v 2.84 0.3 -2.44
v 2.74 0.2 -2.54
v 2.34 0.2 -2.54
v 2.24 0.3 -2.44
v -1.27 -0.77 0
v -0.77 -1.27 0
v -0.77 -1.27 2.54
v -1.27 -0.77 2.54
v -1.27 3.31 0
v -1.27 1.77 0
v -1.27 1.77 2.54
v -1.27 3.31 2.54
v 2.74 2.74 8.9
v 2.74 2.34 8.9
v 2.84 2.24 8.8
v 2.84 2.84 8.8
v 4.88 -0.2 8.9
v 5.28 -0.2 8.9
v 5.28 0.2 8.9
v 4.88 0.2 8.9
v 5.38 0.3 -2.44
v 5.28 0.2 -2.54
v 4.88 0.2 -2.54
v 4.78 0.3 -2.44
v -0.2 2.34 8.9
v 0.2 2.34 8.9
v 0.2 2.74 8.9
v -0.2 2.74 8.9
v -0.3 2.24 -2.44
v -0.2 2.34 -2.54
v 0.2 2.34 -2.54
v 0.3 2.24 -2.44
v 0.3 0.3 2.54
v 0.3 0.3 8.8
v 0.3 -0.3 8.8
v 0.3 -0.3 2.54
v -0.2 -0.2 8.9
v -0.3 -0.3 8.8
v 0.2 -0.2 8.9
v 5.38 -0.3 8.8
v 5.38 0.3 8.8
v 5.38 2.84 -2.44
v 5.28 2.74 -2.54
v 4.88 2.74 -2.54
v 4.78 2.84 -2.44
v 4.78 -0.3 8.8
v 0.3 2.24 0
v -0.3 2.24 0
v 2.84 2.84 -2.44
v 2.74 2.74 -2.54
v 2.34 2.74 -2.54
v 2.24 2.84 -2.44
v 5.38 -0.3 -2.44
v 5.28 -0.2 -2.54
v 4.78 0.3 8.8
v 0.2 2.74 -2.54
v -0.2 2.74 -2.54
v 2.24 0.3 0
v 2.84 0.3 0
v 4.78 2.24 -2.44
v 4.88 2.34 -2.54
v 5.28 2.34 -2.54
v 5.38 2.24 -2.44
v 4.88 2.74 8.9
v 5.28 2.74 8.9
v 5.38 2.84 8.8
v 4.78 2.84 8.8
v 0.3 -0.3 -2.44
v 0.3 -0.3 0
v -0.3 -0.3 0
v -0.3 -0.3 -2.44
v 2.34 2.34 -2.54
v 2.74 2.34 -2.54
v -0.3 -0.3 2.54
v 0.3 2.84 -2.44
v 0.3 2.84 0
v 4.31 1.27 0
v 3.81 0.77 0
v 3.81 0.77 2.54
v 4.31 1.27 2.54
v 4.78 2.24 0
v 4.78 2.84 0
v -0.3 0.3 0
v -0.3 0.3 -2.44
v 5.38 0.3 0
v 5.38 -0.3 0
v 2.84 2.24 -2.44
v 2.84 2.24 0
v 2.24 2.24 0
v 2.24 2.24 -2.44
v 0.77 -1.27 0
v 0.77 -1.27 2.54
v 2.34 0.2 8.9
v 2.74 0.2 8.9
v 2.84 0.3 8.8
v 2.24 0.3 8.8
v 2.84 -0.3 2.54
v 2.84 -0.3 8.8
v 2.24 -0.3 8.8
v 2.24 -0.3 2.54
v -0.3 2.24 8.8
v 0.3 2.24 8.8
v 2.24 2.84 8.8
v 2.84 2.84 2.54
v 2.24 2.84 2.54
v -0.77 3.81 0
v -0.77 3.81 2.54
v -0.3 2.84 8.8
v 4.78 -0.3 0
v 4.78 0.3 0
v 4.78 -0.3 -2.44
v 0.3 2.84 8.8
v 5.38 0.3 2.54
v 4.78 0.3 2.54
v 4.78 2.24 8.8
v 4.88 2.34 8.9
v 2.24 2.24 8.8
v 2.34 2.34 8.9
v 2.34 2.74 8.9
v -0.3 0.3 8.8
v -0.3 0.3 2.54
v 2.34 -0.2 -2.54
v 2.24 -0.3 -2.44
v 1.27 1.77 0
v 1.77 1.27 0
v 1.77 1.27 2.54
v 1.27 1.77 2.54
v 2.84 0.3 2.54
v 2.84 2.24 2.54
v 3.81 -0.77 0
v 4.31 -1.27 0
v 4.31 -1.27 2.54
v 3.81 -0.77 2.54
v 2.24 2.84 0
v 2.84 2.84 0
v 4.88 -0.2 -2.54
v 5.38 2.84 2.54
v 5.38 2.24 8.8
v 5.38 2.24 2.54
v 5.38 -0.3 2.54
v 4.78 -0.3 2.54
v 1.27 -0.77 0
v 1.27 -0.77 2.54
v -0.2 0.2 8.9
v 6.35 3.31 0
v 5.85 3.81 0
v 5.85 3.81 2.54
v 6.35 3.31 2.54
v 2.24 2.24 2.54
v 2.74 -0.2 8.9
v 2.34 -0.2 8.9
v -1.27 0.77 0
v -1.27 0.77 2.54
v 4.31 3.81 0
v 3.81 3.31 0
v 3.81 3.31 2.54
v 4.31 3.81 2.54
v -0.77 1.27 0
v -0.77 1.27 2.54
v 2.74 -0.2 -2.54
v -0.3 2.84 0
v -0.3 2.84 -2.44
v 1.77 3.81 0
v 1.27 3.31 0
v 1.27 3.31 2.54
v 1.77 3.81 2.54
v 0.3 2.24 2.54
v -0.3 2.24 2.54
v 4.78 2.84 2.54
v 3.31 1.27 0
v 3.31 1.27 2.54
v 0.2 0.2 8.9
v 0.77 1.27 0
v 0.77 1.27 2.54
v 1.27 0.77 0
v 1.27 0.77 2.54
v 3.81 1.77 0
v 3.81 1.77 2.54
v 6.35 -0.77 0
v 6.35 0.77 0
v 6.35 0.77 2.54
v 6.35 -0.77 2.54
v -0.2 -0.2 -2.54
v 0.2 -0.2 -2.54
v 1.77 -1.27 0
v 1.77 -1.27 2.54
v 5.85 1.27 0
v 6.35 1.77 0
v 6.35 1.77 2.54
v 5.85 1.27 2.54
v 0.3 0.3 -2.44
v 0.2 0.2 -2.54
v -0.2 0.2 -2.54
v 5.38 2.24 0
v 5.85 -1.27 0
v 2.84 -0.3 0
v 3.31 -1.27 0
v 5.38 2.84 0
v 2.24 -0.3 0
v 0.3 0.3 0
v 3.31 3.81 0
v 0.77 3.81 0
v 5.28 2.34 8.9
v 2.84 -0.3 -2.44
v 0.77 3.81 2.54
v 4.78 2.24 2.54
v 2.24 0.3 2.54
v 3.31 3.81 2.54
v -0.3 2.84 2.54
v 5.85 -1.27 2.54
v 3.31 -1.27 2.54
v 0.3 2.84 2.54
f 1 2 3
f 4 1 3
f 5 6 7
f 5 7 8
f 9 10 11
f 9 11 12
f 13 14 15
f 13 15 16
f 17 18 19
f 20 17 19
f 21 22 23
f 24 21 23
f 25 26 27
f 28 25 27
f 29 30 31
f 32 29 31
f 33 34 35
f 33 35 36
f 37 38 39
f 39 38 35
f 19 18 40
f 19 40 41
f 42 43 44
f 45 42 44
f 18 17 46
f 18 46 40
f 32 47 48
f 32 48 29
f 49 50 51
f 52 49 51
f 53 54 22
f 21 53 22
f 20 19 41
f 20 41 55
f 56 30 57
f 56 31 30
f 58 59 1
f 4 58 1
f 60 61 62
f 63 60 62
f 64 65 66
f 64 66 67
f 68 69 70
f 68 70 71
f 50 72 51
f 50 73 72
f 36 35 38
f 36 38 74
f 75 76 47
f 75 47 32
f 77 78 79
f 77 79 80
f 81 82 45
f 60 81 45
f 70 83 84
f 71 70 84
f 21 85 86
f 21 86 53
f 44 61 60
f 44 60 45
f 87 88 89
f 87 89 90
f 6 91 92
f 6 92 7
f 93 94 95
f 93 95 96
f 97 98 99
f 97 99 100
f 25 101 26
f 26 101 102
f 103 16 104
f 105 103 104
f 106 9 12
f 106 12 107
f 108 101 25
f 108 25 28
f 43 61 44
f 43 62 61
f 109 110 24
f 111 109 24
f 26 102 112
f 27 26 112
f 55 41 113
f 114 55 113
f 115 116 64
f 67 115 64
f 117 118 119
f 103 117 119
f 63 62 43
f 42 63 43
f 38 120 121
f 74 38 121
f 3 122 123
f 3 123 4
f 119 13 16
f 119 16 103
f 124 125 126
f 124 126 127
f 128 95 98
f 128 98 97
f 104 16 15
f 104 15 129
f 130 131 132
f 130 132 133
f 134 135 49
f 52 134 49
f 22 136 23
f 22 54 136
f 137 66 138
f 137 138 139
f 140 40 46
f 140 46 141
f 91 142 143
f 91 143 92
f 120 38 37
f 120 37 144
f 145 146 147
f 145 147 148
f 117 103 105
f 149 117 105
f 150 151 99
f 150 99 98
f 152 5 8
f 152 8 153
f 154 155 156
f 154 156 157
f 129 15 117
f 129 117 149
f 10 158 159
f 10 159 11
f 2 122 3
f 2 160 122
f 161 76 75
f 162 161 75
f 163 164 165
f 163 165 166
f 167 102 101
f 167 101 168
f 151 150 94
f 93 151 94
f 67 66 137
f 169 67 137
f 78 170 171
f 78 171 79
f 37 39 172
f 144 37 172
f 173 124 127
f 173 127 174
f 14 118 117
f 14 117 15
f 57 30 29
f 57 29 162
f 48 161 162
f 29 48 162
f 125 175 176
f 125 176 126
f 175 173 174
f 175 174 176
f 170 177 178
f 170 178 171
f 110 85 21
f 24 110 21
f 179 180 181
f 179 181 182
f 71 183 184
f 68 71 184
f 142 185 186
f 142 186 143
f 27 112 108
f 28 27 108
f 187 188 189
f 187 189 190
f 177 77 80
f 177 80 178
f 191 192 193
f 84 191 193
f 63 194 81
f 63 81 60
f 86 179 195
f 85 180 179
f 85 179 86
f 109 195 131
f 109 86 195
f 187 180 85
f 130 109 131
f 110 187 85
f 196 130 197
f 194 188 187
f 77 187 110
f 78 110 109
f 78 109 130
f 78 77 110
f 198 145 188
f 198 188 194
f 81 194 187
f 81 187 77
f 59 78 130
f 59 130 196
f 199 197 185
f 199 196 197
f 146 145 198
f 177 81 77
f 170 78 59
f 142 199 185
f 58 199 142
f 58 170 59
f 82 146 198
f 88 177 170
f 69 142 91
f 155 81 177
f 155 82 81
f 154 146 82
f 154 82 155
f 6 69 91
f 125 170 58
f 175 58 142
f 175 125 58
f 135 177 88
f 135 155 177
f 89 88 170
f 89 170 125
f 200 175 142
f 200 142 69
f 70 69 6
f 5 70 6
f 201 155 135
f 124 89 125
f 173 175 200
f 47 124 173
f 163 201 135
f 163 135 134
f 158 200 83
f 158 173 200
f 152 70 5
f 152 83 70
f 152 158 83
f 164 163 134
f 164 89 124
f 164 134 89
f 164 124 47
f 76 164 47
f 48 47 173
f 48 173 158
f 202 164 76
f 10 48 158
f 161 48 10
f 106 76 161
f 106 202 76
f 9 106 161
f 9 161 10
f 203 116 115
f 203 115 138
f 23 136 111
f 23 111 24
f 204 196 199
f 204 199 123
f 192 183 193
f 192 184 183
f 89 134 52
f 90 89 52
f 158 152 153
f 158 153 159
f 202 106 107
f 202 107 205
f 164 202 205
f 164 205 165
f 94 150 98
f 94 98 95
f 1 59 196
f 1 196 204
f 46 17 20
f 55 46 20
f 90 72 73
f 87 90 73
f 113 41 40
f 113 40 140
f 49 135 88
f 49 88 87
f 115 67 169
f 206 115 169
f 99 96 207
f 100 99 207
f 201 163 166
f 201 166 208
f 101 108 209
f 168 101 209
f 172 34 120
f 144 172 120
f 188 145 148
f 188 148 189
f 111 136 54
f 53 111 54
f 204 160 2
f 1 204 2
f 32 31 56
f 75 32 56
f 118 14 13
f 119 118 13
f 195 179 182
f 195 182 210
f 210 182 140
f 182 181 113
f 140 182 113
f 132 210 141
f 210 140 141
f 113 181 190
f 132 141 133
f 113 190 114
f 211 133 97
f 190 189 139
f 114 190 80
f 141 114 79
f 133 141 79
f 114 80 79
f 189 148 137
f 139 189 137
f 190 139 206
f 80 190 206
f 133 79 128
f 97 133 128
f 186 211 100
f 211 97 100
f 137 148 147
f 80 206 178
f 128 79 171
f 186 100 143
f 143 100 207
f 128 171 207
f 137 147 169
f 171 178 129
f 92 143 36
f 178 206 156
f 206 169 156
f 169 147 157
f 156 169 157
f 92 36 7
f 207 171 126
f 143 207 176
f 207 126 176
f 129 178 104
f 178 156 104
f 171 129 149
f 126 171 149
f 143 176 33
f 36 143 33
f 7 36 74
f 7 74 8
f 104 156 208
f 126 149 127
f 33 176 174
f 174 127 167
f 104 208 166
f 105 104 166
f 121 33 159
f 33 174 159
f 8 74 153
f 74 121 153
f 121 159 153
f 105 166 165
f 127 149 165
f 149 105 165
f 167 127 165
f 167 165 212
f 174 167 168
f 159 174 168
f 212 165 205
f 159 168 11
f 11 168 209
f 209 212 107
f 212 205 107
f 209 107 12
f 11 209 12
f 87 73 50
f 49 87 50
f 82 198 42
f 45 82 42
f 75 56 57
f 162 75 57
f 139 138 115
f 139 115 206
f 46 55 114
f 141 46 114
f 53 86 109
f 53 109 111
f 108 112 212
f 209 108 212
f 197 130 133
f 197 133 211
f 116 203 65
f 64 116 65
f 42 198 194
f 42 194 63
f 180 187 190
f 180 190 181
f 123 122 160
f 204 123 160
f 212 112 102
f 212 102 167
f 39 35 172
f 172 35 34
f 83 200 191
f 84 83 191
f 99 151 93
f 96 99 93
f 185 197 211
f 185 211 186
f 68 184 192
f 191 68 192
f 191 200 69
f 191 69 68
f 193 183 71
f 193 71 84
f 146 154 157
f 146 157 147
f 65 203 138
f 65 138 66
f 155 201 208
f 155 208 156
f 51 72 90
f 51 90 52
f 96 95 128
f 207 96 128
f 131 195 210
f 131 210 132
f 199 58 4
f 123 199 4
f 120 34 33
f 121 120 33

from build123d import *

# Parameters (mm, degrees)
PLASTIC_DEPTH                     = 2.54
SKETCH2_W                         = 11.44
SKETCH2_H                         = 0.6
CONTACT_DEPTH                     = 0.3
CHAMFER1_SIZE                     = 0.1
PATTERN_LINEAR_1_COUNT            = 3
PATTERN_LINEAR_1_PITCH            = 2.54
PATTERN_LINEAR_1_COUNT_DIR2       = 2
PATTERN_LINEAR_1_PITCH_DIR2       = 2.54
CHAMFER1_OF_PATTERN_LINEAR_1_SIZE = 0.1


with BuildPart() as part:
    # Sketch1 → Plastic (new body)
    with BuildSketch(Plane.XY):
        Polygon((-0.77, 1.27), (0.77, 1.27), (1.27, 0.77), (1.27, -0.77), (0.77, -1.27), (-0.77, -1.27), (-1.27, -0.77), (-1.27, 0.77), align=None)
    plastic = extrude(amount=PLASTIC_DEPTH)

    # Sketch2 → Contact (add, symmetric)
    with BuildSketch(Plane(origin=(0, 0, 0), x_dir=(0, 0, -1), z_dir=(1, 0, 0))):
        with Locations((-3.18, 0)):
            Rectangle(SKETCH2_W, SKETCH2_H)
    contact = extrude(amount=CONTACT_DEPTH, both=True)

    # Chamfer1
    chamfer1_edges = [part.edges().sort_by_distance(p)[0] for p in [
        (0, -0.3, 8.9),
        (0.3, 0, 8.9),
        (-0.3, 0, -2.54),
        (0, -0.3, -2.54),
        (0, 0.3, -2.54),
        (-0.3, 0, 8.9),
        (0, 0.3, 8.9),
        (0.3, 0, -2.54),
    ]]
    chamfer(chamfer1_edges, length=CHAMFER1_SIZE)

    # Линейный массив1: Plastic, Contact 3 × 2
    with Locations(*[(i * PATTERN_LINEAR_1_PITCH, j * PATTERN_LINEAR_1_PITCH_DIR2, 0) for i in range(PATTERN_LINEAR_1_COUNT) for j in range(PATTERN_LINEAR_1_COUNT_DIR2) if (i, j) != (0, 0)]):
        add(plastic)
        add(contact)

    # Chamfer1 of Линейный массив1
    chamfer1_of_pattern_linear_1_edges = [part.edges().sort_by_distance(p)[0] for p in [
        (0, 2.24, 8.9),
        (0.3, 2.54, 8.9),
        (-0.3, 2.54, -2.54),
        (0, 2.24, -2.54),
        (0, 2.84, -2.54),
        (-0.3, 2.54, 8.9),
        (0, 2.84, 8.9),
        (0.3, 2.54, -2.54),
        (2.54, -0.3, 8.9),
        (2.84, 0, 8.9),
        (2.24, 0, -2.54),
        (2.54, -0.3, -2.54),
        (2.54, 0.3, -2.54),
        (2.24, 0, 8.9),
        (2.54, 0.3, 8.9),
        (2.84, 0, -2.54),
        (2.54, 2.24, 8.9),
        (2.84, 2.54, 8.9),
        (2.24, 2.54, -2.54),
        (2.54, 2.24, -2.54),
        (2.54, 2.84, -2.54),
        (2.24, 2.54, 8.9),
        (2.54, 2.84, 8.9),
        (2.84, 2.54, -2.54),
        (5.08, -0.3, 8.9),
        (5.38, 0, 8.9),
        (4.78, 0, -2.54),
        (5.08, -0.3, -2.54),
        (5.08, 0.3, -2.54),
        (4.78, 0, 8.9),
        (5.08, 0.3, 8.9),
        (5.38, 0, -2.54),
        (5.08, 2.24, 8.9),
        (5.38, 2.54, 8.9),
        (4.78, 2.54, -2.54),
        (5.08, 2.24, -2.54),
        (5.08, 2.84, -2.54),
        (4.78, 2.54, 8.9),
        (5.08, 2.84, 8.9),
        (5.38, 2.54, -2.54),
    ]]
    chamfer(chamfer1_of_pattern_linear_1_edges, length=CHAMFER1_OF_PATTERN_LINEAR_1_SIZE)


solid = part.part
